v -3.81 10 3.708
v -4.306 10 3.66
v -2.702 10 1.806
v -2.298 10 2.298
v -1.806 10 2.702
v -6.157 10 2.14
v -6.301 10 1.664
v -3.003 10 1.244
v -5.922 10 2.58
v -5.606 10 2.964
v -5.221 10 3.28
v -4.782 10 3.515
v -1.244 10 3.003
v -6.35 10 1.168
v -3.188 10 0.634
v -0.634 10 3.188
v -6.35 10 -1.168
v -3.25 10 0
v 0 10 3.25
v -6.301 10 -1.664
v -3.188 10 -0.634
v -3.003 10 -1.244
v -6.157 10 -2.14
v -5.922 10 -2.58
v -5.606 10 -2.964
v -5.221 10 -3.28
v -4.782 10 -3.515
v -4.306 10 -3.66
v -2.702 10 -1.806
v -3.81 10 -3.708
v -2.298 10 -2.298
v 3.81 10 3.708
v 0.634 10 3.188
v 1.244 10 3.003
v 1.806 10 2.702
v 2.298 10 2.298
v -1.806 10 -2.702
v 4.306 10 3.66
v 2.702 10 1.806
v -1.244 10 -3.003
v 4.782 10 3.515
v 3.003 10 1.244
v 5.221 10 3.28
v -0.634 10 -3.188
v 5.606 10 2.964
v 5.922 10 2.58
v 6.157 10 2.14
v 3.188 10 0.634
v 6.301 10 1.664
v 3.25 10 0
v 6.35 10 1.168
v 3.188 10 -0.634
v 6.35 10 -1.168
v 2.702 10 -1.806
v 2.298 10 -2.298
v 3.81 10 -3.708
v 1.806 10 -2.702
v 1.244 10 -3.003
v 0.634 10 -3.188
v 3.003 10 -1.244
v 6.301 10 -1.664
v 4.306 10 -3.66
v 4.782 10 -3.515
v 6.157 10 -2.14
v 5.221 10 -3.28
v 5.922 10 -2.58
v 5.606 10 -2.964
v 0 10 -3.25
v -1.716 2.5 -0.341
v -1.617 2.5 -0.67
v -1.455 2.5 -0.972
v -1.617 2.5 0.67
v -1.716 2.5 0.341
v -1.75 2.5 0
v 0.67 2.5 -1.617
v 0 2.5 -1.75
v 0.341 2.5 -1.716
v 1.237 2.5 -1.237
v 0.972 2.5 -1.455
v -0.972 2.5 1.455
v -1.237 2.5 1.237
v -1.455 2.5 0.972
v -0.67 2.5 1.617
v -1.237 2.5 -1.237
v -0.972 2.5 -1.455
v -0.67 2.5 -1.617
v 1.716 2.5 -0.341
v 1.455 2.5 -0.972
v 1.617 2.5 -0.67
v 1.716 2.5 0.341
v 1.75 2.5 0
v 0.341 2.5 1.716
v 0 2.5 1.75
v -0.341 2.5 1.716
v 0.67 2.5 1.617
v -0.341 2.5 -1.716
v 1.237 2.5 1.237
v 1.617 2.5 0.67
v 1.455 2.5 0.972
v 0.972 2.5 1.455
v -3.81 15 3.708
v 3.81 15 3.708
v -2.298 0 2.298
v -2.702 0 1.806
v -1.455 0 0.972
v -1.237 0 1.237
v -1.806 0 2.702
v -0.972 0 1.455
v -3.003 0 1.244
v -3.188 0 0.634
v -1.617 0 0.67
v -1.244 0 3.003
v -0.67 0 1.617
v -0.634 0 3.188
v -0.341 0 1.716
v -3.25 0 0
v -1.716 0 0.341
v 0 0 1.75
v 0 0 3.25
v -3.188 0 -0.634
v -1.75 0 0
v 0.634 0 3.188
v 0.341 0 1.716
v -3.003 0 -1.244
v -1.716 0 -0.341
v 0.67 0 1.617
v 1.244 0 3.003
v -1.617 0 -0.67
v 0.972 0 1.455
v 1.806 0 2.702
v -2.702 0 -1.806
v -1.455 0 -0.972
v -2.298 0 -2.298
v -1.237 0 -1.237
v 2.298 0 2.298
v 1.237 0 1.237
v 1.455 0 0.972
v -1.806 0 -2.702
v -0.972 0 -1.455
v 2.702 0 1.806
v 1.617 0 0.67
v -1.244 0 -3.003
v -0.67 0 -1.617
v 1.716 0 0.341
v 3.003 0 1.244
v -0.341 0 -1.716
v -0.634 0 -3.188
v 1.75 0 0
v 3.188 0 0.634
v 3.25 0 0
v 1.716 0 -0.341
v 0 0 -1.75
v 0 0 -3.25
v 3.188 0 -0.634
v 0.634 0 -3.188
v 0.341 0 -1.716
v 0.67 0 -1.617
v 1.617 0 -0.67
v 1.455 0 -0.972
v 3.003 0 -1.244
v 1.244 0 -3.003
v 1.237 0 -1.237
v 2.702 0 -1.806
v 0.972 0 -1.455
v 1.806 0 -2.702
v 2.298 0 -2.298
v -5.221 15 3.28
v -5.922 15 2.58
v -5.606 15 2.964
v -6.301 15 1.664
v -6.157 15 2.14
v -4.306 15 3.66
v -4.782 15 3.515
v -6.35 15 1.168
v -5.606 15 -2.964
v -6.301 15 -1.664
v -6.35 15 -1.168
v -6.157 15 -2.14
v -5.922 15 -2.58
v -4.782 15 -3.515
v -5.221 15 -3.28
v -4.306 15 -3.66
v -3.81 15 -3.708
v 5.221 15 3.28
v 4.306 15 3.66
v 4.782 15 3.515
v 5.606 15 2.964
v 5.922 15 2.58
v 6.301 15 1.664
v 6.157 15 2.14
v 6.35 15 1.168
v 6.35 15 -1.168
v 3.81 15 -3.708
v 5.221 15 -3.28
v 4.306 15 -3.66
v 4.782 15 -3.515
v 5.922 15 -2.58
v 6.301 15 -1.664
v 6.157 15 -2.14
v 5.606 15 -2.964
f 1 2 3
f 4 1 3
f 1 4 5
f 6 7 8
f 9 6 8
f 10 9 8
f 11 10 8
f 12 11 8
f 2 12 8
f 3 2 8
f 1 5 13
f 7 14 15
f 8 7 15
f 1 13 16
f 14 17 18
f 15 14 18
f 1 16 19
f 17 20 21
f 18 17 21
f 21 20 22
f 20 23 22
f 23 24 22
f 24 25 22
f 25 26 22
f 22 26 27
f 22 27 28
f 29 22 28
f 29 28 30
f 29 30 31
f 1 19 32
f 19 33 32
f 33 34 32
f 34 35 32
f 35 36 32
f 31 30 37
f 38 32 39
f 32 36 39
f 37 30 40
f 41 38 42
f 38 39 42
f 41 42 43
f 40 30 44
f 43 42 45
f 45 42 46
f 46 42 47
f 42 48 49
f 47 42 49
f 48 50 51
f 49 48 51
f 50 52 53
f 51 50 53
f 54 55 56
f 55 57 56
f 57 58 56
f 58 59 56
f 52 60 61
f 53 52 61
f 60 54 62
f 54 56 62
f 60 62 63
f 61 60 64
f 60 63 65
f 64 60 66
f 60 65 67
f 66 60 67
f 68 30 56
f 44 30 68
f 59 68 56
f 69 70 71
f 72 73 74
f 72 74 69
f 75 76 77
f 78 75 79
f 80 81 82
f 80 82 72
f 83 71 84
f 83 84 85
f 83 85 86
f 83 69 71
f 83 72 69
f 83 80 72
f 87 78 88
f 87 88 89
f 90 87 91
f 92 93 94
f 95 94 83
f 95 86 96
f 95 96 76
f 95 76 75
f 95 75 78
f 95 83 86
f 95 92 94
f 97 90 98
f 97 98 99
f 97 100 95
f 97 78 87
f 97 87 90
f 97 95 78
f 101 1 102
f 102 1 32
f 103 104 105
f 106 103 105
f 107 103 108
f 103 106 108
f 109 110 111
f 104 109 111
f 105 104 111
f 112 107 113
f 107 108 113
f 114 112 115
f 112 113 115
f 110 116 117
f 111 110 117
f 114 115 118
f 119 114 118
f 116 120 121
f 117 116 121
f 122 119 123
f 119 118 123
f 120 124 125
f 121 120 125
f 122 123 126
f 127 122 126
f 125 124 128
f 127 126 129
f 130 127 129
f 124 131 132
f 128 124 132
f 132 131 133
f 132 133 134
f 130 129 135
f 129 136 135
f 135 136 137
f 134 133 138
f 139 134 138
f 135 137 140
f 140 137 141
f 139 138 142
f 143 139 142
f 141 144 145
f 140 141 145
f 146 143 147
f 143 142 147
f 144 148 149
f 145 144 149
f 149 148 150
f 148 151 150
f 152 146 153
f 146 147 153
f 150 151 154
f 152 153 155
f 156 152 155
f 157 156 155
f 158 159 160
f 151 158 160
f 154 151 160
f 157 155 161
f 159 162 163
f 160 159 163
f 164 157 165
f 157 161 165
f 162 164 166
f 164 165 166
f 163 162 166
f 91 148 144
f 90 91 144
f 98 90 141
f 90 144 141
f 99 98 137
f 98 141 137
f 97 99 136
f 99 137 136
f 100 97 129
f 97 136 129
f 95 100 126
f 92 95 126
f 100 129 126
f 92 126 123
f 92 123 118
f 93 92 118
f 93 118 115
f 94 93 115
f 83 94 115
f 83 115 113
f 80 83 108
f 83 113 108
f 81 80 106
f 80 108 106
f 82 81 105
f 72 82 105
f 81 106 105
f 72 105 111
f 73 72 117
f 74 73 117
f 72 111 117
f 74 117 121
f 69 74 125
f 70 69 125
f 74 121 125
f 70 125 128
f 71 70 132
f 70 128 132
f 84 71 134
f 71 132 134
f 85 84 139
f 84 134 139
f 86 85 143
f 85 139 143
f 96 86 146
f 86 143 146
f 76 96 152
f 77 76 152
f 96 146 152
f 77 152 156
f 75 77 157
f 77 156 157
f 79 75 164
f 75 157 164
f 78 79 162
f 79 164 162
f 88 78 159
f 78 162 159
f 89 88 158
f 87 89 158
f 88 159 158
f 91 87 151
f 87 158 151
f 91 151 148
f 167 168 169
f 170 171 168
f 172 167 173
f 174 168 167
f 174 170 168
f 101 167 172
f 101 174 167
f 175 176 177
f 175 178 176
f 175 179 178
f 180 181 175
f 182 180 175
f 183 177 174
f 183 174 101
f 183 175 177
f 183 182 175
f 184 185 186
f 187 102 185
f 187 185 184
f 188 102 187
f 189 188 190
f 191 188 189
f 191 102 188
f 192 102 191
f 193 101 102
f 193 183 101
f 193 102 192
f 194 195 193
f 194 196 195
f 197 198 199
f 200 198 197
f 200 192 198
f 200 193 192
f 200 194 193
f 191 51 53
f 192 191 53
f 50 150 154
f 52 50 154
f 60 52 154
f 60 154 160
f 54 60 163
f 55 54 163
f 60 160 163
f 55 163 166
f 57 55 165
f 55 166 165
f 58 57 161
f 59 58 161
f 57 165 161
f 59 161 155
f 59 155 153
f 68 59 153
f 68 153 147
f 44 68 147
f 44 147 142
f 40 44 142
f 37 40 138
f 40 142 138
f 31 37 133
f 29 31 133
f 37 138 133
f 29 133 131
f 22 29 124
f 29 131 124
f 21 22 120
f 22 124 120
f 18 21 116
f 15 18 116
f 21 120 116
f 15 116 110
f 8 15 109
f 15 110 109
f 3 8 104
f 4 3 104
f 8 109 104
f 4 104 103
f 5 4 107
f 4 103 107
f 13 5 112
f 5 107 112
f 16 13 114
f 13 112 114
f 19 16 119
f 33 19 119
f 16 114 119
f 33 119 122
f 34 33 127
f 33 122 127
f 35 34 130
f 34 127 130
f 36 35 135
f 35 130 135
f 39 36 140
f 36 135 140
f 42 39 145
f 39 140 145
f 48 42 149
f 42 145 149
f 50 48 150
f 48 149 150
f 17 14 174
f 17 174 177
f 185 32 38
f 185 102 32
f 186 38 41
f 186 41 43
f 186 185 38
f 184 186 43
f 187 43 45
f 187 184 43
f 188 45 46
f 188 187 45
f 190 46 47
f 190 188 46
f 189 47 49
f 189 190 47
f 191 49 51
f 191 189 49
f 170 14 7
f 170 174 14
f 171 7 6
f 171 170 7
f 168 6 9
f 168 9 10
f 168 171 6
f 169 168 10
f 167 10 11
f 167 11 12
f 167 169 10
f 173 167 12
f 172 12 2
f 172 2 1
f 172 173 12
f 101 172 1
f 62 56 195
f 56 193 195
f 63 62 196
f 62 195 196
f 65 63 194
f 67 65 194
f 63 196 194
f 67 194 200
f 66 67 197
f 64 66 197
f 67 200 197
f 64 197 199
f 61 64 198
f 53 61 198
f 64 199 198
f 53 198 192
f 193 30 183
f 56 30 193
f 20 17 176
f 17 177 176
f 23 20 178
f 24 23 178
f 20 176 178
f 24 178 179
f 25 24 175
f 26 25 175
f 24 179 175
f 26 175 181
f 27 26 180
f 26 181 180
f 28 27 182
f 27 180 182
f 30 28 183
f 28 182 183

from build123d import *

# Parameters (mm, degrees)
SKETCH1_R           = 3.25
BOSS_EXTRUDE1_DEPTH = 10
SKETCH2_R           = 1.75
CUT_EXTRUDE1_DEPTH  = 2.5
SKETCH3_W           = 12.7
SKETCH3_H           = 7.4168
BOSS_EXTRUDE2_DEPTH = 5
FILLET1_R           = 2.54


with BuildPart() as part:
    # Sketch1 → Boss-Extrude1 (new body)
    with BuildSketch(Plane(origin=(0, 0, 0), x_dir=(1, 0, 0), z_dir=(0, 1, 0))):
        Circle(SKETCH1_R)
    extrude(amount=BOSS_EXTRUDE1_DEPTH)

    # Sketch2 → Cut-Extrude1 (cut)
    with BuildSketch(Plane.XZ):
        Circle(SKETCH2_R)
    extrude(amount=-CUT_EXTRUDE1_DEPTH, mode=Mode.SUBTRACT)

    # Sketch3 → Boss-Extrude2 (add)
    with BuildSketch(Plane(origin=(0, 10, 0), x_dir=(1, 0, 0), z_dir=(0, 1, 0))):
        Rectangle(SKETCH3_W, SKETCH3_H)
    extrude(amount=BOSS_EXTRUDE2_DEPTH)

    # Fillet1
    fillet1_edges = [part.edges().sort_by_distance(p)[0] for p in [
        (6.35, 12.5, 3.7084),
        (6.35, 12.5, -3.7084),
        (-6.35, 12.5, -3.7084),
        (-6.35, 12.5, 3.7084),
    ]]
    fillet(fillet1_edges, radius=FILLET1_R)


solid = part.part
